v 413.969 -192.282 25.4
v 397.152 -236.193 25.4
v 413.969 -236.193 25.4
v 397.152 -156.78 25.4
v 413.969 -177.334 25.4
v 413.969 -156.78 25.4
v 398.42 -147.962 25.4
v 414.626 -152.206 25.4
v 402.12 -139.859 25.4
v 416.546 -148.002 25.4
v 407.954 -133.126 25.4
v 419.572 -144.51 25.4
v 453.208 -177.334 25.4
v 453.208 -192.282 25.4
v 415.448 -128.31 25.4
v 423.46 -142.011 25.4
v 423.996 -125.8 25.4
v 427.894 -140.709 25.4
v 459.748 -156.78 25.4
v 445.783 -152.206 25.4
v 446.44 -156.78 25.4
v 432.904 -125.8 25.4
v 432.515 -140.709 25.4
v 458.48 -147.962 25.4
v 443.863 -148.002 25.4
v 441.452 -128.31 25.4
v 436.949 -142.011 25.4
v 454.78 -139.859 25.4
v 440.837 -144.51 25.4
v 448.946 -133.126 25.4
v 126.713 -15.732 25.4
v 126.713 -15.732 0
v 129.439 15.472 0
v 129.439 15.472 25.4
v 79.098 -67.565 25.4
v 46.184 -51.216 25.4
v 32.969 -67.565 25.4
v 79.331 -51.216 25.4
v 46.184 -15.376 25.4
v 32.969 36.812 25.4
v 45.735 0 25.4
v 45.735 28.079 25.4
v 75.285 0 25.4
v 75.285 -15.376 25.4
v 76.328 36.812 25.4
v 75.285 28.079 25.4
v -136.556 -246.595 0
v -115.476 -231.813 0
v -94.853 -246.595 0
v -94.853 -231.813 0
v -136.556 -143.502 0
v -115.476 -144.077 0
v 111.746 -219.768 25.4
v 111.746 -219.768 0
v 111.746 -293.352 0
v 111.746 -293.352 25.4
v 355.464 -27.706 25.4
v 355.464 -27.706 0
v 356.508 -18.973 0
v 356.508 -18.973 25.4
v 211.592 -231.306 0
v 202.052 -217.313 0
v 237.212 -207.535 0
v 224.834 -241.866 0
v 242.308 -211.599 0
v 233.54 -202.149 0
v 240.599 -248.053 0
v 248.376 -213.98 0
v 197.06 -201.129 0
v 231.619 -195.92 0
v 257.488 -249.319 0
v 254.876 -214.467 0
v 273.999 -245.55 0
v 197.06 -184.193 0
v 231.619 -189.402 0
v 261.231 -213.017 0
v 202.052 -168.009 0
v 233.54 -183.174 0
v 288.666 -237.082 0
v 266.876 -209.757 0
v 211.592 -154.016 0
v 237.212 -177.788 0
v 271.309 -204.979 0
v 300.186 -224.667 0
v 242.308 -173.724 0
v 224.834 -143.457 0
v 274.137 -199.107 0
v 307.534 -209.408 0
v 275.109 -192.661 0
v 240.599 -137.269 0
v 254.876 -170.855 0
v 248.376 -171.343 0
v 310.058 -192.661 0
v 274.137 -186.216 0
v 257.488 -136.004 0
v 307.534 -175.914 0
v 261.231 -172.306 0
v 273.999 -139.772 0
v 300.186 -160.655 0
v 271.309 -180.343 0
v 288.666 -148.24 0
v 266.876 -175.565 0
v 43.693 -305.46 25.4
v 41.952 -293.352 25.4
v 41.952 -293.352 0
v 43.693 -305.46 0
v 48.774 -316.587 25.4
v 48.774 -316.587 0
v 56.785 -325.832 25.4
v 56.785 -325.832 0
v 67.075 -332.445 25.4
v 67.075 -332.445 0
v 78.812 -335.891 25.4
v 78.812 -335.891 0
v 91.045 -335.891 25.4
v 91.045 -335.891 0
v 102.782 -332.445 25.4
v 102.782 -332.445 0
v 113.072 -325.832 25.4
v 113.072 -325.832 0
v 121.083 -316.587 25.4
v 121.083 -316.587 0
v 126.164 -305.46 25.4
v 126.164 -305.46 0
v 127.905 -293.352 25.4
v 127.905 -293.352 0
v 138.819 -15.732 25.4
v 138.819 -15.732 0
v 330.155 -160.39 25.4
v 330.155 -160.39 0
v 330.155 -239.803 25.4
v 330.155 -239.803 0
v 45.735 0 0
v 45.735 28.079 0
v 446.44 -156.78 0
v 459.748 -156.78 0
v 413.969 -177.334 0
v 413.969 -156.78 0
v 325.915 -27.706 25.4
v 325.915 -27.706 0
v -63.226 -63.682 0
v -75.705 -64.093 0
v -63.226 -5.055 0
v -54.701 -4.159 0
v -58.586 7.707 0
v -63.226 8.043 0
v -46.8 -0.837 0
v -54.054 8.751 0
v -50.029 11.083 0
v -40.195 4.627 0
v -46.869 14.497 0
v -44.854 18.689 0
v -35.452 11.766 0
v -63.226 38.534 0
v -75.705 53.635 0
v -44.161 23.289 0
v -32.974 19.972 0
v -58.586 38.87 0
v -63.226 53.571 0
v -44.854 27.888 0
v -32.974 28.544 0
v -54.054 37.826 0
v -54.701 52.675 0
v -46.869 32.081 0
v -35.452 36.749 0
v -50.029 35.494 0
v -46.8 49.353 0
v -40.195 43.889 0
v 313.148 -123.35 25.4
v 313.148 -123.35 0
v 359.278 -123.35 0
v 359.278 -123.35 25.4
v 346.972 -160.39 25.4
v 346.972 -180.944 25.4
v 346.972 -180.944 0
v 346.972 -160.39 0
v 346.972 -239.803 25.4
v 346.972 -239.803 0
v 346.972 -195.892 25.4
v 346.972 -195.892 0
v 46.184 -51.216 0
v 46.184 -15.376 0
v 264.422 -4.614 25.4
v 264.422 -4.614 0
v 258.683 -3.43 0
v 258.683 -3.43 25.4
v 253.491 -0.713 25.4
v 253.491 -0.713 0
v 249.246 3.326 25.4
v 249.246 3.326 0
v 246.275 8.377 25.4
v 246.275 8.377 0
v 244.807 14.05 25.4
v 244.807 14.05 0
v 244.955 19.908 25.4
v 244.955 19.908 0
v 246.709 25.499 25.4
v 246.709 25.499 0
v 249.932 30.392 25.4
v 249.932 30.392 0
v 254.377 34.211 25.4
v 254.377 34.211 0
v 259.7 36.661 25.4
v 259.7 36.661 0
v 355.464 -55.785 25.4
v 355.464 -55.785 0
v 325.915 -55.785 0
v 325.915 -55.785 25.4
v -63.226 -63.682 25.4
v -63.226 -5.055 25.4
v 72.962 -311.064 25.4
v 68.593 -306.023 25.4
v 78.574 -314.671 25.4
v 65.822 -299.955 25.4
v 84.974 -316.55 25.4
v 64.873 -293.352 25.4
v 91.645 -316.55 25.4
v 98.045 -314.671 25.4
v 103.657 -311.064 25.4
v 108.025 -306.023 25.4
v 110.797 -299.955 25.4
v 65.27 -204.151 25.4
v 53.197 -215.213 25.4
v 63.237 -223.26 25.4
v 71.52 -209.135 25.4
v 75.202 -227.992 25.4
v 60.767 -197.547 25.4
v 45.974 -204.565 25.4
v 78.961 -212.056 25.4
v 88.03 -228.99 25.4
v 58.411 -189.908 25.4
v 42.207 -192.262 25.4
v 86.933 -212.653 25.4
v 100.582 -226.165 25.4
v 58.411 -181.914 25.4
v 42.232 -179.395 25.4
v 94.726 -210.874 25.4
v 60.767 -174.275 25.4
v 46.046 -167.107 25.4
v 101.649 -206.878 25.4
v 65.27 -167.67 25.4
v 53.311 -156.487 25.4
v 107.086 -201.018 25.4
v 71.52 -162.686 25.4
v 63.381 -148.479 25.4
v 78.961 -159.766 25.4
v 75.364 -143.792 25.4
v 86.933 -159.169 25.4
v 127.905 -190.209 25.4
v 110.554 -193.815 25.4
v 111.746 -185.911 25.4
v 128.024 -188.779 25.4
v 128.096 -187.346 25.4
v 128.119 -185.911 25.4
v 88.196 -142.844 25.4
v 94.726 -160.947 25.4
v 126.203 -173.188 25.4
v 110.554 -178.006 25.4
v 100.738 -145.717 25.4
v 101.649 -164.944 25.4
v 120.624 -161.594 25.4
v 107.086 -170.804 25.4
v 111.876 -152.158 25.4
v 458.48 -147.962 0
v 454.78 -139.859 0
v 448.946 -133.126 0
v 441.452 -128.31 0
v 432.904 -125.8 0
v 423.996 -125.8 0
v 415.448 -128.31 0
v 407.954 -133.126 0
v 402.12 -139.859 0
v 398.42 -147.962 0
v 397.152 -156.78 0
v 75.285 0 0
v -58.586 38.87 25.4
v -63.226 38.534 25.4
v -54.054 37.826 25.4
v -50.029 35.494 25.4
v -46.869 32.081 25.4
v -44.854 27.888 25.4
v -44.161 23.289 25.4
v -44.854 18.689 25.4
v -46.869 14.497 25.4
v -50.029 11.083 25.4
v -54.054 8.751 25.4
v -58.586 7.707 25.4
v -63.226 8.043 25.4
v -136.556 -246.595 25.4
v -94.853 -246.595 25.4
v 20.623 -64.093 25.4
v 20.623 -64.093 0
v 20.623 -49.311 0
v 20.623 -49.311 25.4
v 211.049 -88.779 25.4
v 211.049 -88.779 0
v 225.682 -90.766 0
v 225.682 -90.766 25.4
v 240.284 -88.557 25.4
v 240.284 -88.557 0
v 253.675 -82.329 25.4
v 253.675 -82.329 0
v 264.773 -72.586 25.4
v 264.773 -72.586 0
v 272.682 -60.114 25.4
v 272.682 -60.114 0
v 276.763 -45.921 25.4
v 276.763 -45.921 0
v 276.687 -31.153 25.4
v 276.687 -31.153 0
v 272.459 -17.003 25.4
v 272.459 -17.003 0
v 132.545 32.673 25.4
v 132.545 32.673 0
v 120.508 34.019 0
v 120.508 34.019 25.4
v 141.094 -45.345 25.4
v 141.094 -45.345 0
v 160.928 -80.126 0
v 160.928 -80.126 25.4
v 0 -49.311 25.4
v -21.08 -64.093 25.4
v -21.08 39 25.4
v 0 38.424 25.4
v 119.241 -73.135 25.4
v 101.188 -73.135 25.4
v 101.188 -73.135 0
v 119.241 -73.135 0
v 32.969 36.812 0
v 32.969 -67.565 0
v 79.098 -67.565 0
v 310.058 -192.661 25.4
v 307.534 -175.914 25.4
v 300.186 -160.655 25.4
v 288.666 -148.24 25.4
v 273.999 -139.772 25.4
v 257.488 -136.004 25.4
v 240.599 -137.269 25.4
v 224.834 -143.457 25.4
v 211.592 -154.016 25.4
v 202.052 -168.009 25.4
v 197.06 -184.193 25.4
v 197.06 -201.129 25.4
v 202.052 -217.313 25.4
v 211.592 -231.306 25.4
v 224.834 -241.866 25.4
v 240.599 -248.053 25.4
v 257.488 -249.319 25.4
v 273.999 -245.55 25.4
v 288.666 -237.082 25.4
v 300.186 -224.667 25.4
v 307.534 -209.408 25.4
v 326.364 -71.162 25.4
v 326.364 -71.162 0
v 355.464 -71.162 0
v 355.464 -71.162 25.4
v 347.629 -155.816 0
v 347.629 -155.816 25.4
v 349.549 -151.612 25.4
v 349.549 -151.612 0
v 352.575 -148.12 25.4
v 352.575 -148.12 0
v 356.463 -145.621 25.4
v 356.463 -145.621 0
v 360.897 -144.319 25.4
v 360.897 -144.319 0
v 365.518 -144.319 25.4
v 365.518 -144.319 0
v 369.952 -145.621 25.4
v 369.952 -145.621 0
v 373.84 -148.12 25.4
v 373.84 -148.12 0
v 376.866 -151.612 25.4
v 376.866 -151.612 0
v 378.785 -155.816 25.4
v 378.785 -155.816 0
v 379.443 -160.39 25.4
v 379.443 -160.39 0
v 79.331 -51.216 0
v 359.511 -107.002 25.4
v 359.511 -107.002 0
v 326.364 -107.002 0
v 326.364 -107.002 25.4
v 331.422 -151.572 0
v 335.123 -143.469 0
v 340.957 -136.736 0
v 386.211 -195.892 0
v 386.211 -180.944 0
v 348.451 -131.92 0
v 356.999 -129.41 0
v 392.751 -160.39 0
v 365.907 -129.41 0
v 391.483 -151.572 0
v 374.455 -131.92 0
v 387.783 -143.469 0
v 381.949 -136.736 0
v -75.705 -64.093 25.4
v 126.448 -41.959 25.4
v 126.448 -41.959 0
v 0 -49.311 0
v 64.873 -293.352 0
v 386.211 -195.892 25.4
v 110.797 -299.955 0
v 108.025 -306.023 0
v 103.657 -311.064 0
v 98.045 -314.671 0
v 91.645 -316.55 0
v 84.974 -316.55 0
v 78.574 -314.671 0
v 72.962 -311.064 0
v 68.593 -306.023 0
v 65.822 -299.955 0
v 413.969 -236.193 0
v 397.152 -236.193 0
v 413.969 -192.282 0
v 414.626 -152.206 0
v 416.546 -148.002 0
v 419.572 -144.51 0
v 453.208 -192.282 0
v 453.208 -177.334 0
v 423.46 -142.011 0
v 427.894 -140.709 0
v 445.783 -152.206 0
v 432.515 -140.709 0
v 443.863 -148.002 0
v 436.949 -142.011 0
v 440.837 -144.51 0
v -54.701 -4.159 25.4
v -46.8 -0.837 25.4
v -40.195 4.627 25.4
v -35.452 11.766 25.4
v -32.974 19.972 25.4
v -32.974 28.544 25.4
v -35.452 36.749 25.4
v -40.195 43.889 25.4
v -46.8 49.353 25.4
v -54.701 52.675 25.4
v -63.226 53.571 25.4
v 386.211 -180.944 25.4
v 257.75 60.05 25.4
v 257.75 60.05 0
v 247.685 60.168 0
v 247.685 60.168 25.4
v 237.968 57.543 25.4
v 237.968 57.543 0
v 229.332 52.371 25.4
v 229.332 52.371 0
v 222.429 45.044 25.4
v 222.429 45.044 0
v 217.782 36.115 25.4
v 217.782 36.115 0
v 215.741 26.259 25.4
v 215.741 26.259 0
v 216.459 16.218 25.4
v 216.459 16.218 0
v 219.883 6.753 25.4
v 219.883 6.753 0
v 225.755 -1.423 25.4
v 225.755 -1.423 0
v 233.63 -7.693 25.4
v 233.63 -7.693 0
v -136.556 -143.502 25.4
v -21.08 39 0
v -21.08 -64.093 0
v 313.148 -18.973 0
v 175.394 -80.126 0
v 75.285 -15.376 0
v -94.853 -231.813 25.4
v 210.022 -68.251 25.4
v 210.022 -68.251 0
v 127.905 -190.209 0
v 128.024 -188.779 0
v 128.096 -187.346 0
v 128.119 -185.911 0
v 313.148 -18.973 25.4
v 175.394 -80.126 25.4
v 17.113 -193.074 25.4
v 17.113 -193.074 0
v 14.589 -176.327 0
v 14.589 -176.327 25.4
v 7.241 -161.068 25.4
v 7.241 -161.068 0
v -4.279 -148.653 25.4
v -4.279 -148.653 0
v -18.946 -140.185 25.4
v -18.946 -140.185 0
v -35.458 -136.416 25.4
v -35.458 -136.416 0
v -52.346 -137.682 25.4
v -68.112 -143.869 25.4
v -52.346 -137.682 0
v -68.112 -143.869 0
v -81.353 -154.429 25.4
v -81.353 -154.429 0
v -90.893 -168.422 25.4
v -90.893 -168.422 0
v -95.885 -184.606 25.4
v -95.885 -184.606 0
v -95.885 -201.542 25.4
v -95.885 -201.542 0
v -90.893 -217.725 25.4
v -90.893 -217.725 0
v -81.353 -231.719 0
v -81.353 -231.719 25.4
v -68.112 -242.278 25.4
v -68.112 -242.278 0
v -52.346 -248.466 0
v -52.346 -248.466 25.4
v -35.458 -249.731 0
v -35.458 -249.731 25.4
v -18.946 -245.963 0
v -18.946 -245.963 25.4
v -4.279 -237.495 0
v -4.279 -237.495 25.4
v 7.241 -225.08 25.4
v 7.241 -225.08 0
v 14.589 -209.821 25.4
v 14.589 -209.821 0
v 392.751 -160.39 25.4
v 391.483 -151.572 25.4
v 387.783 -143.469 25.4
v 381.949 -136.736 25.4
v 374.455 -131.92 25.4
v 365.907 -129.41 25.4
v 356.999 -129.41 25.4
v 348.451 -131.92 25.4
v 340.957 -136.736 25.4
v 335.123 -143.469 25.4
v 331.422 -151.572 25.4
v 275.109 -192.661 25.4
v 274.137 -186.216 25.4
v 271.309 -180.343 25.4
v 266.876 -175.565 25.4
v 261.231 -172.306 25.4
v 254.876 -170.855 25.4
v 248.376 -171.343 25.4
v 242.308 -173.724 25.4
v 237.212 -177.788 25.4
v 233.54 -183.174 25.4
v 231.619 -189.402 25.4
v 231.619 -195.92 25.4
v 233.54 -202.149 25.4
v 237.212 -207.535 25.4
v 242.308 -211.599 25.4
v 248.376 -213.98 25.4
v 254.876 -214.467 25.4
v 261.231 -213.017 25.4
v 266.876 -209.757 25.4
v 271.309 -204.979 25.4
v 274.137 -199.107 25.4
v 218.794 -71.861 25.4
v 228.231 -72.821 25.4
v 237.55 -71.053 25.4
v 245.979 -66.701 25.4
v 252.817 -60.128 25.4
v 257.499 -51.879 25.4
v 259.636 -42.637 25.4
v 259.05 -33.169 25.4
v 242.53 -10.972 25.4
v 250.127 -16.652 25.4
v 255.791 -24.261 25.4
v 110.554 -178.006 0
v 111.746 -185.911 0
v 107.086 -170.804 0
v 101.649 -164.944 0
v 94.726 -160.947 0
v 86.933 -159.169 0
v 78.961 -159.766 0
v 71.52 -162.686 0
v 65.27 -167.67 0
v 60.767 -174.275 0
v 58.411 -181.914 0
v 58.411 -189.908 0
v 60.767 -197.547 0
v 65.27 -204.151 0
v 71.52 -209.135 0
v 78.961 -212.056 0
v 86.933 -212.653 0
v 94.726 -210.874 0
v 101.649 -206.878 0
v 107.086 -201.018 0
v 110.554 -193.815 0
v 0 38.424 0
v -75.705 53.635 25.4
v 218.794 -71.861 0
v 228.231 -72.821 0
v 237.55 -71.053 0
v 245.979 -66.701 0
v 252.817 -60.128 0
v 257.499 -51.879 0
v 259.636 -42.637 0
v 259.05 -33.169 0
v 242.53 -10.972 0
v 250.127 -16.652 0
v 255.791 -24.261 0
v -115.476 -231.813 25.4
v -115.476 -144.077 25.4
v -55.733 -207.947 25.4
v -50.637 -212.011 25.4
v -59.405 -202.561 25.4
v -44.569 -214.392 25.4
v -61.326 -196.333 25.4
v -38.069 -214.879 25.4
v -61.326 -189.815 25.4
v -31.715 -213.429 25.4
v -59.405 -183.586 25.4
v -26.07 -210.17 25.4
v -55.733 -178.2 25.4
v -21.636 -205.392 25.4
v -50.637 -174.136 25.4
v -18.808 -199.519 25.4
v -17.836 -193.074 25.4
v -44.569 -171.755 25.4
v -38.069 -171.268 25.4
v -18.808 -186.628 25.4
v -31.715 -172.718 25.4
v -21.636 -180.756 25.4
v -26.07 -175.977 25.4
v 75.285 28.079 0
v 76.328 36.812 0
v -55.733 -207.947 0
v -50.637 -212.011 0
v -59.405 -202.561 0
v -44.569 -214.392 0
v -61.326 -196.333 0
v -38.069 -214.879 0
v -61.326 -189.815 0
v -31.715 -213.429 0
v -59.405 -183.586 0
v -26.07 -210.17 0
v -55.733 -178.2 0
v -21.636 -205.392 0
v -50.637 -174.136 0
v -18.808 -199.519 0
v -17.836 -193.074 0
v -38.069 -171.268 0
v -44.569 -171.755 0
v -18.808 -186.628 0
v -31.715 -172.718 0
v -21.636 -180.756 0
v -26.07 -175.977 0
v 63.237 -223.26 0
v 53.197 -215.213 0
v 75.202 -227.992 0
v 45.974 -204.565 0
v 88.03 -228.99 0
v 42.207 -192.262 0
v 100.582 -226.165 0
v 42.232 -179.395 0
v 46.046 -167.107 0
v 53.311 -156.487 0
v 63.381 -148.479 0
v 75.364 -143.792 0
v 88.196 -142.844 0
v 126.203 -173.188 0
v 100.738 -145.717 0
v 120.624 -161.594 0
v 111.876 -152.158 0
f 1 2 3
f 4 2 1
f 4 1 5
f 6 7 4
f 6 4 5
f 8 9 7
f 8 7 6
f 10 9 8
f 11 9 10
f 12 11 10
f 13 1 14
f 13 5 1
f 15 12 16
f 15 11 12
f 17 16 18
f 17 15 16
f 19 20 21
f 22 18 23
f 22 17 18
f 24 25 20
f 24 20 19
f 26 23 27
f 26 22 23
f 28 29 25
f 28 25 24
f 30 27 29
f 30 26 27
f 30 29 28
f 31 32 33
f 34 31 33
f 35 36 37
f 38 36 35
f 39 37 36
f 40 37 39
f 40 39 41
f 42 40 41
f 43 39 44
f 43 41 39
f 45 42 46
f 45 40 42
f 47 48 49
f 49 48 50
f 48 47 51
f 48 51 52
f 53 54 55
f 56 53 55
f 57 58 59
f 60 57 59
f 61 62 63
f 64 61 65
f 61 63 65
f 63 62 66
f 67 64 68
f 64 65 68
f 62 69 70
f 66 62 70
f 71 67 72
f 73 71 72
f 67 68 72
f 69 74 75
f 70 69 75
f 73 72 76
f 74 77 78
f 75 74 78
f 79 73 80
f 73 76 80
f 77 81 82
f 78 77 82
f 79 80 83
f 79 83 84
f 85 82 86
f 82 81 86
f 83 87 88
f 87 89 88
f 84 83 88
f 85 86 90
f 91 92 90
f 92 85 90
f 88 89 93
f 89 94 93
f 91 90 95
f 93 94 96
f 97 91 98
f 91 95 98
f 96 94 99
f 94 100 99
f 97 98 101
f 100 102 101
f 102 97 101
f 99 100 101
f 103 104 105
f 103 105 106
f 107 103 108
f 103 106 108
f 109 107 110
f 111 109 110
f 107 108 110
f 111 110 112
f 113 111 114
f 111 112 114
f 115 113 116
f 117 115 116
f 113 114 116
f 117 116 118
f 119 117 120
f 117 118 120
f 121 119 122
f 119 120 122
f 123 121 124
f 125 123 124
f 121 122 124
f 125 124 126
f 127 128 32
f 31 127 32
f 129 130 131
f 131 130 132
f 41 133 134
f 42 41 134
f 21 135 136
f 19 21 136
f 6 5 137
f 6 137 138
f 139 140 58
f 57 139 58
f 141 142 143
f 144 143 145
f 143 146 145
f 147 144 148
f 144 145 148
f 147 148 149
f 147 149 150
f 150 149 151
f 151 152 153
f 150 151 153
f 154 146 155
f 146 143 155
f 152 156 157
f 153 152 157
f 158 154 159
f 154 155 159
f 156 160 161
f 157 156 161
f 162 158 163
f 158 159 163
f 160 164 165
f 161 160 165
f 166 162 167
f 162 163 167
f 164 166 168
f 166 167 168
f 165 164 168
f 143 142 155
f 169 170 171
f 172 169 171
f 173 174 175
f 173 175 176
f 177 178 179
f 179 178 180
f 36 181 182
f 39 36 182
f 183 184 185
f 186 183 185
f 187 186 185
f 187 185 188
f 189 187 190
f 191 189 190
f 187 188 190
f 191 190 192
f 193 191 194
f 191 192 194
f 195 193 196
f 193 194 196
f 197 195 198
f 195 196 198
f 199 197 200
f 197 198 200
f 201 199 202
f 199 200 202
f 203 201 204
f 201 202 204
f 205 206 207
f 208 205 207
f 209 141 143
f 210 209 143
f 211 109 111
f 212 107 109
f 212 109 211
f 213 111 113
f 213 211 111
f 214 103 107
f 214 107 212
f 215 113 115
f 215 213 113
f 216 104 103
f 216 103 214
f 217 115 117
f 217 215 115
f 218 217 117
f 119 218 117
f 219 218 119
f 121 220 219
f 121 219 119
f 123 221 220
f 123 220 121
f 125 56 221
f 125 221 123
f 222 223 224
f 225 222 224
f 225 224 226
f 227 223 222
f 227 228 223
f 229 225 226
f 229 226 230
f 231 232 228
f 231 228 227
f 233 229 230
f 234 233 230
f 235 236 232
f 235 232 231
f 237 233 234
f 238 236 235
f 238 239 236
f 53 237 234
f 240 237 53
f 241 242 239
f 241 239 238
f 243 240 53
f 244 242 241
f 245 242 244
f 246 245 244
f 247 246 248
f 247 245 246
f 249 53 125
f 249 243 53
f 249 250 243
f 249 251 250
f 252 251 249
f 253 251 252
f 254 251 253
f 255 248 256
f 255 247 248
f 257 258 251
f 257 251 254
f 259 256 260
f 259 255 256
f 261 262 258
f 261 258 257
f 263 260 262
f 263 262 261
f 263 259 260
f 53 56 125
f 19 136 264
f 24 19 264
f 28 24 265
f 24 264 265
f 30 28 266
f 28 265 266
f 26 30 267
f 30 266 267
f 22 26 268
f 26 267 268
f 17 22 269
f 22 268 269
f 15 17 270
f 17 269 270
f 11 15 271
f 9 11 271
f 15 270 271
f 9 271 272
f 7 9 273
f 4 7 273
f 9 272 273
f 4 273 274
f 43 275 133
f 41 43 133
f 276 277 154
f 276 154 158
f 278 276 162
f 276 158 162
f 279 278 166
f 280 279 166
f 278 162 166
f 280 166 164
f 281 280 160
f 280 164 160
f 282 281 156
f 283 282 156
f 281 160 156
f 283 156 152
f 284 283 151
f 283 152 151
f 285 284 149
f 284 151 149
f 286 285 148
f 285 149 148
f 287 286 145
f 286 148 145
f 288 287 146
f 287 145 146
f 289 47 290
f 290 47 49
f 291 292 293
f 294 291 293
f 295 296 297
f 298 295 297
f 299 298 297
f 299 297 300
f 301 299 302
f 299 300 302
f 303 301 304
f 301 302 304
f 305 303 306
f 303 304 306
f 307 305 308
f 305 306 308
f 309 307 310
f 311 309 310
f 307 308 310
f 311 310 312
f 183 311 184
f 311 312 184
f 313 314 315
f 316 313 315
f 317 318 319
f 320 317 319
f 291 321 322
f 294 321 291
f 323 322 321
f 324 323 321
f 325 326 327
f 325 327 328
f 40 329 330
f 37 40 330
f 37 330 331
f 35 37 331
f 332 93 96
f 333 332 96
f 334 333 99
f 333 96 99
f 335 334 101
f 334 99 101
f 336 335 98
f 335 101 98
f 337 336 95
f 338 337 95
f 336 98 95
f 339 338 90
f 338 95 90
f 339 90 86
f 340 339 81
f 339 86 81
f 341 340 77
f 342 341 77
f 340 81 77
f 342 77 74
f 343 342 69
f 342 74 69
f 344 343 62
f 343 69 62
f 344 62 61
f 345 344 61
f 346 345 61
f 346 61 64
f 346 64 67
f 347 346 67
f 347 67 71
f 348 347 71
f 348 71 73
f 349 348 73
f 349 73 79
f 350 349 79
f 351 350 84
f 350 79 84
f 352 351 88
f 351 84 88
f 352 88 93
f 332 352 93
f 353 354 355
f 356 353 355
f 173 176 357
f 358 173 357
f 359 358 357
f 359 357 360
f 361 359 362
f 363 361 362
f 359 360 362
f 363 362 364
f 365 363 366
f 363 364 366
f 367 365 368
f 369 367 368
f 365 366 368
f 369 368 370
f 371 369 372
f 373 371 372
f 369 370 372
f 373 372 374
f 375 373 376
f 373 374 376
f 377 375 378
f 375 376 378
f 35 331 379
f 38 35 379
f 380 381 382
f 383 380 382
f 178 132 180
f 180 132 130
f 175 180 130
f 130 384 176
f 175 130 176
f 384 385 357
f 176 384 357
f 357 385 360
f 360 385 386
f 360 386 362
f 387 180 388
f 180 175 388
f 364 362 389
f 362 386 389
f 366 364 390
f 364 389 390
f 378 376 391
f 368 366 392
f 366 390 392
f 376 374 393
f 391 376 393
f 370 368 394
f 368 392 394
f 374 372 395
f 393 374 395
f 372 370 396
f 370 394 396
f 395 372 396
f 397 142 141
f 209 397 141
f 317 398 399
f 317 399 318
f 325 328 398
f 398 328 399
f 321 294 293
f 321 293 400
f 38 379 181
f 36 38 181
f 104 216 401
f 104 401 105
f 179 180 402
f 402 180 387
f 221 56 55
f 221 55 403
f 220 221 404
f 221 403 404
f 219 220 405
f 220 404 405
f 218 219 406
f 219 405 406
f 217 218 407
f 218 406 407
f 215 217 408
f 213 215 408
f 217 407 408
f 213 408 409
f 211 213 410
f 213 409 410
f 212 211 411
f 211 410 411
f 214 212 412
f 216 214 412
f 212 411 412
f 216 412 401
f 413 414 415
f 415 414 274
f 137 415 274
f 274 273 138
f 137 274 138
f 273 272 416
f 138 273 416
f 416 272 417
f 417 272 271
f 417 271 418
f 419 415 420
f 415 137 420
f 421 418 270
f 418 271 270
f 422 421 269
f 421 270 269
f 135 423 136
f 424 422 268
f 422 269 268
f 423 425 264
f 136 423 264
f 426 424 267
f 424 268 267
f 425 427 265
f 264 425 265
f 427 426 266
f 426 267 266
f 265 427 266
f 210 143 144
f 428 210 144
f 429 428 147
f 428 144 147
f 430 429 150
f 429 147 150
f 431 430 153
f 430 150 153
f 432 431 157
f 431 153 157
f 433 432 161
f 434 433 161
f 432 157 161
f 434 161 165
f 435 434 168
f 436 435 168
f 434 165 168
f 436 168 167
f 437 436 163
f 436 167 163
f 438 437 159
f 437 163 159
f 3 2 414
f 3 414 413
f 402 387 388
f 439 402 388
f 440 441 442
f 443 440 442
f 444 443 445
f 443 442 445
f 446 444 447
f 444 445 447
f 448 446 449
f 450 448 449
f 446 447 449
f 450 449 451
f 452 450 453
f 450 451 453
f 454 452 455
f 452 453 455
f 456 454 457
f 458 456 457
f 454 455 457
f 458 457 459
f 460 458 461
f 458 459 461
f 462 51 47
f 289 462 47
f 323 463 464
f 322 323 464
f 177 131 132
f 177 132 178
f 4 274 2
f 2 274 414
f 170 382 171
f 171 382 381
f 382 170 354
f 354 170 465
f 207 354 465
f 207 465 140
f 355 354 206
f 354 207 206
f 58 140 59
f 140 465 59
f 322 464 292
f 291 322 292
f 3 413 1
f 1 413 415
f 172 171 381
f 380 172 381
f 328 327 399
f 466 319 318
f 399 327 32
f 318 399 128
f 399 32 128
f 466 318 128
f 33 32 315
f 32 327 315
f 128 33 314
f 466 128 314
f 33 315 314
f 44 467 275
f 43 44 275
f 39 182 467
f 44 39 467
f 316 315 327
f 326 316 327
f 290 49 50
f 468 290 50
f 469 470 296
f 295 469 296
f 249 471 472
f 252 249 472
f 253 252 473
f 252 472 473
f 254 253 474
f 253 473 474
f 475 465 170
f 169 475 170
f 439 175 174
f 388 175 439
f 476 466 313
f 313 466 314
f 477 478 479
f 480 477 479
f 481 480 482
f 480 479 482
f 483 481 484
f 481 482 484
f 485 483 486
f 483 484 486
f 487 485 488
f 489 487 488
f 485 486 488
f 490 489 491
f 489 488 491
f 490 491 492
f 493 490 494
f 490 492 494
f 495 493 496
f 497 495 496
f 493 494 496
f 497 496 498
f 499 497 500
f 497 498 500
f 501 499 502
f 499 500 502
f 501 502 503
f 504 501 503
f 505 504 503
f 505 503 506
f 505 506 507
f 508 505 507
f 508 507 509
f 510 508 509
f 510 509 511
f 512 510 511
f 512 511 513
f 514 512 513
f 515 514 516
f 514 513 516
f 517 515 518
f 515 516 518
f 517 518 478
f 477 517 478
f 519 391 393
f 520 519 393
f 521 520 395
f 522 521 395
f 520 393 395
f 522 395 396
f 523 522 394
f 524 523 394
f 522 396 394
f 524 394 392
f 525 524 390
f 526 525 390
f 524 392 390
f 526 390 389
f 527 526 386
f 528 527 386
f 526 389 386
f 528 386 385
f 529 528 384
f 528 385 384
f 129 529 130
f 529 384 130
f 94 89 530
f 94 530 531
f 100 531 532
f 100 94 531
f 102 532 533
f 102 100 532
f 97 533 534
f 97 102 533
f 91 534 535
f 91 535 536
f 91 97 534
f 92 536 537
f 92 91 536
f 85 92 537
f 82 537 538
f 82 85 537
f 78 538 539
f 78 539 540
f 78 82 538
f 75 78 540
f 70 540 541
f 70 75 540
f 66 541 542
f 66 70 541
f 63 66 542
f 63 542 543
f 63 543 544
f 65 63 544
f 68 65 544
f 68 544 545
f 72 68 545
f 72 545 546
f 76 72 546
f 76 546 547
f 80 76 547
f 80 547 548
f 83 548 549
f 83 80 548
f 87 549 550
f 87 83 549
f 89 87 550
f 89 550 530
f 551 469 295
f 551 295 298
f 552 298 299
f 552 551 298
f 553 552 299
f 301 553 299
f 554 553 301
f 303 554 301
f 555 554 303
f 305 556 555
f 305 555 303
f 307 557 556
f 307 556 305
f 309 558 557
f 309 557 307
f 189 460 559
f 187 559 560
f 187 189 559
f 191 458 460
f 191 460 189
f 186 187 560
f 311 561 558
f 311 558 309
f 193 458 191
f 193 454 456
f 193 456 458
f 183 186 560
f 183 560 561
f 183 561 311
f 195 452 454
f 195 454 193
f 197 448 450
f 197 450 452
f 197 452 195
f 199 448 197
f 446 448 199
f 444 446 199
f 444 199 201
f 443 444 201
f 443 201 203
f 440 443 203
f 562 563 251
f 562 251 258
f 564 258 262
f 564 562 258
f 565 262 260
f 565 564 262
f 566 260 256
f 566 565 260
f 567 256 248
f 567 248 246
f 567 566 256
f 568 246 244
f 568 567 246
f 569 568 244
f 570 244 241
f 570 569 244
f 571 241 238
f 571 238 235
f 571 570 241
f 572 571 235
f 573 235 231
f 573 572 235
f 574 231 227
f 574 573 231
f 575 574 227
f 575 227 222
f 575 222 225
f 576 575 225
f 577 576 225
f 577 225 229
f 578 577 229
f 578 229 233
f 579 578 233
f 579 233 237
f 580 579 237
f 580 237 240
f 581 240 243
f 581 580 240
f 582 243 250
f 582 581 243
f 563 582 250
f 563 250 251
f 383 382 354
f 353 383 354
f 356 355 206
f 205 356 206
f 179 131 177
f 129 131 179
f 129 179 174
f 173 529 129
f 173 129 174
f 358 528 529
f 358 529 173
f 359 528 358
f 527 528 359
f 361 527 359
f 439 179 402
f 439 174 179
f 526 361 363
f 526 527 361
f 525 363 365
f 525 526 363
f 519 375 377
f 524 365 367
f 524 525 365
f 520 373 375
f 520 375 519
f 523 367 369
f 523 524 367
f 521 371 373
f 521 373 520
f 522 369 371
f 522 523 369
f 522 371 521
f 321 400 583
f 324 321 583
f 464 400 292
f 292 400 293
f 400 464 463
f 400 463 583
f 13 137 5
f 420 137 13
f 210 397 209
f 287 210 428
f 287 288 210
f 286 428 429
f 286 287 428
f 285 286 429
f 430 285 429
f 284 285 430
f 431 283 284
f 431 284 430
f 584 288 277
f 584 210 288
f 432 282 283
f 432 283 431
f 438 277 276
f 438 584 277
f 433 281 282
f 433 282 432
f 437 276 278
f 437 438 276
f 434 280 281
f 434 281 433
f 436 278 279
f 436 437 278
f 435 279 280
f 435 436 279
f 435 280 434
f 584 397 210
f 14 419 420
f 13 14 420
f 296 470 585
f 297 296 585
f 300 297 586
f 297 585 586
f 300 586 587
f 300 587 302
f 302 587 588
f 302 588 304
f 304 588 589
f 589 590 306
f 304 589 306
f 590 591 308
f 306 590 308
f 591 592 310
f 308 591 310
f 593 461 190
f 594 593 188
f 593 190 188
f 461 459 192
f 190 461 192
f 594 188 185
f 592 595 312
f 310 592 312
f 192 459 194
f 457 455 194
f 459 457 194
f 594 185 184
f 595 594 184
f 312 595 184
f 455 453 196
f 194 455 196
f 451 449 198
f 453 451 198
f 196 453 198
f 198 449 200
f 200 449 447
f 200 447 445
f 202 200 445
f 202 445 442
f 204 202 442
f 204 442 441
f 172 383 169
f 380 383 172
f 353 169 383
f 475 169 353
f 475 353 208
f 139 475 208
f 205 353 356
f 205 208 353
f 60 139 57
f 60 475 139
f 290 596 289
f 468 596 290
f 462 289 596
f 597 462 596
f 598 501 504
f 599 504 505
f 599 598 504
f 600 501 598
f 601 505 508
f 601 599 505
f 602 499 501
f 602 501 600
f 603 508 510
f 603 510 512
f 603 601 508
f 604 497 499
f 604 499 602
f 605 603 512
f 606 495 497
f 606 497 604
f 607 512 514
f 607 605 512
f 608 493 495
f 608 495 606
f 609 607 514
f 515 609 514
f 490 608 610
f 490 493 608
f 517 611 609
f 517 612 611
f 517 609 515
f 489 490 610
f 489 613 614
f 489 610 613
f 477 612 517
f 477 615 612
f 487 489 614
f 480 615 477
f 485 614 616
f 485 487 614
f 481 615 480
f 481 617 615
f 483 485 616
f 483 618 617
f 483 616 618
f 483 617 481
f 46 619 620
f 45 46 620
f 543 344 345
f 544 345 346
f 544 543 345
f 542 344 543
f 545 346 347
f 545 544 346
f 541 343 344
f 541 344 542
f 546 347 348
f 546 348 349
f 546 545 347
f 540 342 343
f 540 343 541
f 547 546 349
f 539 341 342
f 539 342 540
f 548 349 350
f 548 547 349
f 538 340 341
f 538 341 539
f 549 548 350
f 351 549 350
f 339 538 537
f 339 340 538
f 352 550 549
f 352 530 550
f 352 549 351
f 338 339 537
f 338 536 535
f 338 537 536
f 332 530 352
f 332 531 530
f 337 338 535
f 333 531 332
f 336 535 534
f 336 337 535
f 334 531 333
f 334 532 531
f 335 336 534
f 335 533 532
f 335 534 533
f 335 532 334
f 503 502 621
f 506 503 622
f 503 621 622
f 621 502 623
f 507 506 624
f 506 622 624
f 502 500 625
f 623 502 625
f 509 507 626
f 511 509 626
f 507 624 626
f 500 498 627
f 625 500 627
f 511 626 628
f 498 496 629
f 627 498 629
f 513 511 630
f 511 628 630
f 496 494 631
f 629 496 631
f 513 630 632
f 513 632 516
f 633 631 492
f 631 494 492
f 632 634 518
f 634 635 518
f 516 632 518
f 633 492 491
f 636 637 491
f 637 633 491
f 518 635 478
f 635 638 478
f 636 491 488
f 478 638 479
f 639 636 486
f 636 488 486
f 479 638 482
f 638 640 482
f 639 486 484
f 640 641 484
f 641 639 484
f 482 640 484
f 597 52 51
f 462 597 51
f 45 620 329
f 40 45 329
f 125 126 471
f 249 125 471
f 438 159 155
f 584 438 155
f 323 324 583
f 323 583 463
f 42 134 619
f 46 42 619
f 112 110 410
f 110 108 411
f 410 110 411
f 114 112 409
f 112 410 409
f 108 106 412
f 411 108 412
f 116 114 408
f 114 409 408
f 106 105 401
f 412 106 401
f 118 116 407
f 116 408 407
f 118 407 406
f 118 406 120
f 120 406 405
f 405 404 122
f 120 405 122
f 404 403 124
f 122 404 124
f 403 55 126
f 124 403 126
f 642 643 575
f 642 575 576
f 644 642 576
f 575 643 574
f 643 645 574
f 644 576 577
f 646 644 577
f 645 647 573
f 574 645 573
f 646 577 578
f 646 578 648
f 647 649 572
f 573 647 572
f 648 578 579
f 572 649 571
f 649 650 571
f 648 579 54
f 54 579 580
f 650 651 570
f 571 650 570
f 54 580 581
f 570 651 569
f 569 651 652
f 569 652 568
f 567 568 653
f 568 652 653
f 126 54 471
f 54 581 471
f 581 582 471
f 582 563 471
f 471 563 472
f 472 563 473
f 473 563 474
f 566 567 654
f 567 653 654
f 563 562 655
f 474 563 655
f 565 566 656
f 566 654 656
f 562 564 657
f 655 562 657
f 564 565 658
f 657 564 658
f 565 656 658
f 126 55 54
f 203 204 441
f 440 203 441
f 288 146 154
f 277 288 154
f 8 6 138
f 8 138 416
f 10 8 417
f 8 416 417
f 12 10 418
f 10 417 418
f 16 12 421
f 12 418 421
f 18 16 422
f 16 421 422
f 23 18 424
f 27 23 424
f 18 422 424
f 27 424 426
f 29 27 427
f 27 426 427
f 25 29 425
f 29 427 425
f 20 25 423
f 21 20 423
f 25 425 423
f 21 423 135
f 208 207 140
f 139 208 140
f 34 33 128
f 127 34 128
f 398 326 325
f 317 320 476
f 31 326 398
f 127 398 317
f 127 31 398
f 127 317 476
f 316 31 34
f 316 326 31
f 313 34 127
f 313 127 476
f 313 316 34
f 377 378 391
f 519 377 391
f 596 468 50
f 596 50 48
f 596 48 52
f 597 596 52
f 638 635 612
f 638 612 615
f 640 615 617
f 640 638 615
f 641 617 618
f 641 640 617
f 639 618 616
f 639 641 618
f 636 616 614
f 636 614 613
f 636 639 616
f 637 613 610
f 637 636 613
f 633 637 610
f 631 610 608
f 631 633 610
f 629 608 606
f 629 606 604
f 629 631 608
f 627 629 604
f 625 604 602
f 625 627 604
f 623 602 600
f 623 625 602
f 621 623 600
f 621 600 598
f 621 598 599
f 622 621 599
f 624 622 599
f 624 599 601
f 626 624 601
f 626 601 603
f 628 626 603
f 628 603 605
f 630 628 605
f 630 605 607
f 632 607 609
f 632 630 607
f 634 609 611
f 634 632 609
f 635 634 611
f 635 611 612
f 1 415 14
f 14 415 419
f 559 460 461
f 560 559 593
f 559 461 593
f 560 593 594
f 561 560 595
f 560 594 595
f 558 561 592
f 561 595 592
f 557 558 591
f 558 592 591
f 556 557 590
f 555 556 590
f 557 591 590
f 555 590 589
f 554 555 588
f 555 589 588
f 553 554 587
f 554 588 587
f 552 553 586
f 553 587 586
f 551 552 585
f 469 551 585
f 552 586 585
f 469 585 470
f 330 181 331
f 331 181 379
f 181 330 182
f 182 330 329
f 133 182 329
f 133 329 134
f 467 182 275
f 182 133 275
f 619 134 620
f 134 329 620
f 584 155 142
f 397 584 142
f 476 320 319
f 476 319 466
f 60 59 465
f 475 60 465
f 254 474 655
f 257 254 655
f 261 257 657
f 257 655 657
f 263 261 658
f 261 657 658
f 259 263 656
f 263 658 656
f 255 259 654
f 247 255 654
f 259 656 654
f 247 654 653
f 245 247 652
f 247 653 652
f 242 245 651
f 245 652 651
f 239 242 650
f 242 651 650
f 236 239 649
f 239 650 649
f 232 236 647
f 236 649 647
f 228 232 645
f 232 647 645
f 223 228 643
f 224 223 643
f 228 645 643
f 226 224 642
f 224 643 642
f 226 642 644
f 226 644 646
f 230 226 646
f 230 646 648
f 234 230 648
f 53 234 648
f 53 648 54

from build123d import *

# Parameters (mm, degrees)
F1_DEPTH = 25.4
F0_R     = 56.8165173198
F0_R_2   = 21.8669462393
F0_R_3   = 26.817322963
F0_W     = 16.8169438839
F0_H     = 43.9109653234
F0_W_2   = 39.239615202
F0_H_2   = 14.948412776
F0_H_3   = 20.5540657043


# Not quite as in the source:
# - a feature names something its author has since deleted; it is built from what else it names


with BuildPart() as f1:
    # F0 (on Top) → F1 (new body)
    with BuildSketch(Plane.XY):
        Polygon((0, 38.4244211018), (-21.0802424699, 38.9997065067), (-21.0802424699, -64.0931278467), (20.6227079034, -64.0931278467), (20.6227079034, -49.3109039962), (0, -49.3109039962), align=None)
    extrude(amount=F1_DEPTH)


with BuildPart() as f1b:
    # F0 (on Top) → F1, piece 2 (new body)
    with BuildSketch(Plane.XY):
        Polygon((-115.4761333019, -144.0774456908), (-136.5563757718, -143.5021602859), (-136.5563757718, -246.5949946394), (-94.8534253985, -246.5949946394), (-94.8534253985, -231.8127707889), (-115.4761333019, -231.8127707889), align=None)
    extrude(amount=F1_DEPTH)


with BuildPart() as f1c:
    # F0 (on Top) → F1, piece 3 (new body)
    with BuildSketch(Plane.XY):
        with BuildLine():
            ThreePointArc((-63.2257908583, -5.0553847104), (-32.6597396912, 24.2578806356), (-63.2257908583, 53.5711459816))
            Line((-63.2257908583, 53.5711459816), (-63.2257908583, 38.5343246162))
            ThreePointArc((-63.2257908583, 38.5343246162), (-44.1613435888, 23.2886993326), (-63.2257908583, 8.0430740491))
            Line((-63.2257908583, 8.0430740491), (-63.2257908583, -5.0553847104))
        make_face()
        Polygon((-63.2257908583, 38.5343246162), (-63.2257908583, 53.5711459816), (-75.7045000792, 53.6349639297), (-75.7045000792, -64.0931278467), (-63.2257908583, -63.6819154024), (-63.2257908583, -5.0553847104), (-63.2257908583, 8.0430740491), align=None)
    extrude(amount=F1_DEPTH)


with BuildPart() as f1d:
    # F0 (on Top) → F1, piece 4 (new body)
    with BuildSketch(Plane.XY):
        Polygon((46.1844839156, -51.2163303792), (46.1844839156, -67.5651431084), (79.0982320905, -67.5651431084), (79.3314799666, -51.2163303792), align=None)
        Polygon((76.328240335, 36.8124432862), (45.7351021469, 36.8124432862), (45.7351021469, 28.0794482678), (75.2847343683, 28.0794482678), align=None)
        Polygon((45.7351021469, 36.8124432862), (32.9688377678, 36.8124432862), (32.9688377678, 0), (45.7351021469, 0), (45.7351021469, 28.0794482678), align=None)
        Polygon((45.7351021469, 0), (32.9688377678, 0), (32.9688377678, -15.3763499111), (46.1844839156, -15.3763499111), (75.2847343683, -15.3763499111), (75.2847343683, 0), align=None)
        Polygon((46.1844839156, -15.3763499111), (32.9688377678, -15.3763499111), (32.9688377678, -67.5651431084), (46.1844839156, -67.5651431084), (46.1844839156, -51.2163303792), align=None)
    extrude(amount=F1_DEPTH)


with BuildPart() as f1e:
    # F0 (on Top) → F1, piece 5 (new body)
    with BuildSketch(Plane.XY):
        Polygon((132.544696331, 32.672625035), (120.5077841878, 34.0194553137), (101.1880040169, -73.1353610754), (119.2409023643, -73.1353610754), (126.4477819204, -41.9589281082), (141.0944137755, -45.3447070969), (160.9281301498, -80.1260992885), (175.3935366869, -80.1260992885), align=None)
        Polygon((138.8186067343, -15.7316308469), (126.7129331827, -15.7316308469), (129.4385045767, 15.4717667028), align=None, mode=Mode.SUBTRACT)
    extrude(amount=F1_DEPTH)


with BuildPart() as f1f:
    # F0 (on Top) → F1, piece 6 (new body)
    with BuildSketch(Plane.XY):
        Polygon((326.3639559736, -107.0016261656), (326.3639559736, -123.3504388947), (359.2777041486, -123.3504388947), (359.5109520247, -107.0016261656), align=None)
        Polygon((356.5077123931, -18.9728525002), (325.9145742049, -18.9728525002), (325.9145742049, -27.7058475185), (355.4642064264, -27.7058475185), align=None)
        Polygon((325.9145742049, -18.9728525002), (313.1483098259, -18.9728525002), (313.1483098259, -55.7852957863), (325.9145742049, -55.7852957863), (325.9145742049, -27.7058475185), align=None)
        Polygon((325.9145742049, -55.7852957863), (313.1483098259, -55.7852957863), (313.1483098259, -71.1616456974), (326.3639559736, -71.1616456974), (355.4642064264, -71.1616456974), (355.4642064264, -55.7852957863), align=None)
        Polygon((326.3639559736, -71.1616456974), (313.1483098259, -71.1616456974), (313.1483098259, -123.3504388947), (326.3639559736, -123.3504388947), (326.3639559736, -107.0016261656), align=None)
    extrude(amount=F1_DEPTH)


with BuildPart() as f1g:
    # F0 (on Top) → F1, piece 7 (new body)
    with BuildSketch(Plane.XY):
        with Locations((-39.7034101188, -193.0736601353)):
            Circle(F0_R)
        with Locations((-39.7034101188, -193.0736601353)):
            Circle(F0_R_2, mode=Mode.SUBTRACT)
    extrude(amount=F1_DEPTH)


with BuildPart() as f1h:
    # F0 (on Top) → F1, piece 8 (new body)
    with BuildSketch(Plane.XY):
        with BuildLine():
            Line((127.9051303864, -293.3522760868), (111.7459100421, -293.3522760868))
            ThreePointArc((111.7459100421, -293.3522760868), (88.3093892006, -316.7887969283), (64.8728683591, -293.3522760868))
            Line((64.8728683591, -293.3522760868), (41.952047497, -293.3522760868))
            ThreePointArc((41.952047497, -293.3522760868), (84.9285889417, -336.3288175315), (127.9051303864, -293.3522760868))
        make_face()
        with BuildLine():
            Line((111.7459100421, -185.910910368), (111.7459100421, -219.7677314667))
            ThreePointArc((111.7459100421, -219.7677314667), (122.8262382091, -206.6285643046), (127.9051303864, -190.208569169))
            Line((127.9051303864, -190.208569169), (127.9051303864, -185.910910368))
            Line((127.9051303864, -185.910910368), (111.7459100421, -185.910910368))
        make_face()
        with BuildLine():
            ThreePointArc((127.9051303864, -190.208569169), (122.8262382091, -206.6285643046), (111.7459100421, -219.7677314667))
            Line((111.7459100421, -219.7677314667), (111.7459100421, -293.3522760868))
            Line((111.7459100421, -293.3522760868), (127.9051303864, -293.3522760868))
            Line((127.9051303864, -293.3522760868), (127.9051303864, -190.208569169))
        make_face()
        with BuildLine():
            ThreePointArc((127.9051303864, -190.208569169), (128.0658585701, -188.0624108039), (128.1194790103, -185.910910368))
            ThreePointArc((128.1194790103, -185.910910368), (46.0459608573, -167.1068011384), (111.7459100421, -219.7677314667))
            Line((111.7459100421, -219.7677314667), (111.7459100421, -185.910910368))
            Line((111.7459100421, -185.910910368), (127.9051303864, -185.910910368))
            Line((127.9051303864, -185.910910368), (127.9051303864, -190.208569169))
        make_face()
        with Locations((84.928587079, -185.910910368)):
            Circle(F0_R_3, mode=Mode.SUBTRACT)
    extrude(amount=F1_DEPTH)


with BuildPart() as f1i:
    # F0 (on Top) → F1, piece 9 (new body)
    with BuildSketch(Plane.XY):
        with Locations((253.241851305, -192.6612166895)):
            Circle(F0_R)
        with Locations((253.241851305, -192.6612166895)):
            Circle(F0_R_2, mode=Mode.SUBTRACT)
    extrude(amount=F1_DEPTH)


with BuildPart() as f1j:
    # F0 (on Top) → F1, piece 10 (new body)
    with BuildSketch(Plane.XY):
        with Locations((338.5631293058, -217.8478464484)):
            Rectangle(F0_W, F0_H)
        with BuildLine():
            ThreePointArc((392.7511572838, -160.3898853064), (361.4529073238, -129.0916353464), (330.1546573639, -160.3898853064))
            Line((330.1546573639, -160.3898853064), (346.9716012478, -160.3898853064))
            ThreePointArc((346.9716012478, -160.3898853064), (363.2073700428, -144.1541165113), (379.4431388378, -160.3898853064))
            Line((379.4431388378, -160.3898853064), (392.7511572838, -160.3898853064))
        make_face()
        with Locations((366.5914088488, -188.4181573987)):
            Rectangle(F0_W_2, F0_H_2)
        with Locations((338.5631293058, -170.6669181585)):
            Rectangle(F0_W, F0_H_3)
        with Locations((338.5631293058, -188.4181573987)):
            Rectangle(F0_W, F0_H_2)
    extrude(amount=F1_DEPTH)


with BuildPart() as f1k:
    # F0 (on Top) → F1, piece 11 (new body)
    with BuildSketch(Plane.XY):
        with Locations((405.560197978, -214.2378575618)):
            Rectangle(F0_W, F0_H)
        with BuildLine():
            ThreePointArc((459.748225956, -156.7798964198), (428.449975996, -125.4816464598), (397.1517260361, -156.7798964198))
            Line((397.1517260361, -156.7798964198), (413.96866992, -156.7798964198))
            ThreePointArc((413.96866992, -156.7798964198), (430.204438715, -140.5441276248), (446.44020751, -156.7798964198))
            Line((446.44020751, -156.7798964198), (459.748225956, -156.7798964198))
        make_face()
        with Locations((433.588477521, -184.8081685121)):
            Rectangle(F0_W_2, F0_H_2)
        with Locations((405.560197978, -167.0569292719)):
            Rectangle(F0_W, F0_H_3)
        with Locations((405.560197978, -184.8081685121)):
            Rectangle(F0_W, F0_H_2)
    extrude(amount=F1_DEPTH)


with BuildPart() as f1l:
    # F0 (on Top) → F1, piece 12 (new body)
    with BuildSketch(Plane.XY):
        with BuildLine():
            Line((259.6997884058, 36.6609323504), (257.7501463465, 60.0499304928))
            ThreePointArc((257.7501463465, 60.0499304928), (217.7821931165, 36.1153467221), (233.6296155648, -7.692880672))
            ThreePointArc((233.6296155648, -7.692880672), (257.4994597468, -51.8785067865), (210.0222513706, -68.2508524094))
            Line((210.0222513706, -68.2508524094), (211.0486635561, -88.7789601735))
            ThreePointArc((211.0486635561, -88.7789601735), (269.1727052446, -66.6322843389), (264.4217915855, -4.6136718735))
            ThreePointArc((264.4217915855, -4.6136718735), (244.806886102, 14.0497048531), (259.6997884058, 36.6609323504))
        make_face()
    extrude(amount=F1_DEPTH)


solid = Compound([f1.part, f1b.part, f1c.part, f1d.part, f1e.part, f1f.part, f1g.part, f1h.part, f1i.part, f1j.part, f1k.part, f1l.part])
